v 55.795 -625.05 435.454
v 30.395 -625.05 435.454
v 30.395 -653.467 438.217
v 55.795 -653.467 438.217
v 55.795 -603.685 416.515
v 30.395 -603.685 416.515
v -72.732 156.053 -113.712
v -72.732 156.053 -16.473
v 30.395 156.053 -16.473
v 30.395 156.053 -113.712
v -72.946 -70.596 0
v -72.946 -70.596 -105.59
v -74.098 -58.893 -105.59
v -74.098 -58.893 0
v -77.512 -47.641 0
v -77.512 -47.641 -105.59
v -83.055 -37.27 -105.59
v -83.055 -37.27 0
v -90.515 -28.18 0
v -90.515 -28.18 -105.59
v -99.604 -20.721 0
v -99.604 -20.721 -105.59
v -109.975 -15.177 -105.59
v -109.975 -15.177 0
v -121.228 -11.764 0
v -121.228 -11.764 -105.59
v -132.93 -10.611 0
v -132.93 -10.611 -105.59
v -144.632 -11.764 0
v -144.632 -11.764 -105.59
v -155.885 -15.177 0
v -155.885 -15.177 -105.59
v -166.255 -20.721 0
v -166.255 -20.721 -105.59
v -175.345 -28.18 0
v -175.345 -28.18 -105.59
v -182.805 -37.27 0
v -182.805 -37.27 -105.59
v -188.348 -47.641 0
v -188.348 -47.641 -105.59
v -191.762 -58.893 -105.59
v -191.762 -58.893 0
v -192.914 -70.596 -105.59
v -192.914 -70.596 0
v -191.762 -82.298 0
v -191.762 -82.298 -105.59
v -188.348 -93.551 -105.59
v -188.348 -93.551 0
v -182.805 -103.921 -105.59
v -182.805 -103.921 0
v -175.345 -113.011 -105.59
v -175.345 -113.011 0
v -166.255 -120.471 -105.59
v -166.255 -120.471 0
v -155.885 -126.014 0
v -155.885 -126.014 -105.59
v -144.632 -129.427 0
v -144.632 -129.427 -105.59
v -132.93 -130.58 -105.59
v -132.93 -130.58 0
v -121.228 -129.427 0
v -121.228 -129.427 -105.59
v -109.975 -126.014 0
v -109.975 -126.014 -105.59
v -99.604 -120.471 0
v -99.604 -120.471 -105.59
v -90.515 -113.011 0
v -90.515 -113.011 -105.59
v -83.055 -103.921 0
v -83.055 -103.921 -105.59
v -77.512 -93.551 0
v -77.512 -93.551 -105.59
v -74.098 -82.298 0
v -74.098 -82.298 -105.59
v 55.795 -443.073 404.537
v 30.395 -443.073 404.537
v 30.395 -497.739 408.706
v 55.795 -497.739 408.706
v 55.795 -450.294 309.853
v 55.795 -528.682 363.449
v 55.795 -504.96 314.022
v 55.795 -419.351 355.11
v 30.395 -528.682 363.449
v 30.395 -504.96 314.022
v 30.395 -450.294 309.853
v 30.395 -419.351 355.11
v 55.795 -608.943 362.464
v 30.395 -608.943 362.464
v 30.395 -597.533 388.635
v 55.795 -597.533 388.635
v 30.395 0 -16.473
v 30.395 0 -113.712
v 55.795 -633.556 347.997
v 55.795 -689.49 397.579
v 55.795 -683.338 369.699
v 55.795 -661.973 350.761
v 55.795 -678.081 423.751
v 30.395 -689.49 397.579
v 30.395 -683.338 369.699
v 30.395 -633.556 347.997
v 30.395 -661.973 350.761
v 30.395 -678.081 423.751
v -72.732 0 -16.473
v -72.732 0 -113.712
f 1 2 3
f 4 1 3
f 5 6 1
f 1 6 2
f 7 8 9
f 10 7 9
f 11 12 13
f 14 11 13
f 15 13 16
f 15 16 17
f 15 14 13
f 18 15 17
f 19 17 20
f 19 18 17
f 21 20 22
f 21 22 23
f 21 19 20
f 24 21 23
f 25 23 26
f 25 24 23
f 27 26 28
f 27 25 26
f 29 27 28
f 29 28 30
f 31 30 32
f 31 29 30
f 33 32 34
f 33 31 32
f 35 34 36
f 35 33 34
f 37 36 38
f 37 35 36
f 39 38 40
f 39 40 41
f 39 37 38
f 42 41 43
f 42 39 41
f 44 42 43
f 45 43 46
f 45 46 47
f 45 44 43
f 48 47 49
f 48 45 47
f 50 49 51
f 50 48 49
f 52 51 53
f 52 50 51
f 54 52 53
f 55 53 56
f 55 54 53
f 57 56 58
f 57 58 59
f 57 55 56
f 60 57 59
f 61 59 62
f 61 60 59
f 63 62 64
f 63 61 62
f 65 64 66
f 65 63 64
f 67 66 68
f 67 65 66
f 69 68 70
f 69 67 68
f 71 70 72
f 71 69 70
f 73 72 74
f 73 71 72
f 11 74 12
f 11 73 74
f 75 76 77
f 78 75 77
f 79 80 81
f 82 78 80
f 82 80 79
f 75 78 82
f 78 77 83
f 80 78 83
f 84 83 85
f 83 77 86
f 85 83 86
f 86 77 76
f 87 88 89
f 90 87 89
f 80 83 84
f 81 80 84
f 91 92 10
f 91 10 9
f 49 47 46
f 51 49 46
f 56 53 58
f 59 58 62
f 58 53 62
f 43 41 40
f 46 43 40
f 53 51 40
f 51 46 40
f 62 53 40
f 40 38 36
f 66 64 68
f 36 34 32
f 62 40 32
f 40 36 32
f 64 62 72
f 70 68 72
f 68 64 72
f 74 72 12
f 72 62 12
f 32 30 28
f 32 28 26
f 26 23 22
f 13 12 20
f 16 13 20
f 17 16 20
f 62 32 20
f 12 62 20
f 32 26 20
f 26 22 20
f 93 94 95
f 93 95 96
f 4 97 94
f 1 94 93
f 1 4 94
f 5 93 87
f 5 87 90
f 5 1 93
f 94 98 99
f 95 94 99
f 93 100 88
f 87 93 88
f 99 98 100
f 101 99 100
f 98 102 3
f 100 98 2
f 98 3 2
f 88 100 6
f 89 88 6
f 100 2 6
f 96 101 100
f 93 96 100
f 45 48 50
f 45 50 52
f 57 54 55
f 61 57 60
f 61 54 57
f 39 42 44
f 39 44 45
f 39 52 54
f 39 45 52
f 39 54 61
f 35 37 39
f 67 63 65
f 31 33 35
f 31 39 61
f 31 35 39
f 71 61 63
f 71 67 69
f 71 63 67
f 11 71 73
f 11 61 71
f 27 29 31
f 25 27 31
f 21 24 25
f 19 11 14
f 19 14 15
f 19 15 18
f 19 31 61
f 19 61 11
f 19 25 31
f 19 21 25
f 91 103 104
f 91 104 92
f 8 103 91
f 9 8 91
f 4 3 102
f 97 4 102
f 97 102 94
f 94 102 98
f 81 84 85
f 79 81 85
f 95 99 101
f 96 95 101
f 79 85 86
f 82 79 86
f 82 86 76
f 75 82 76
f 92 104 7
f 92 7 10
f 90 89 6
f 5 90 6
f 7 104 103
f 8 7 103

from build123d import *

# Parameters (mm, degrees)
F0_W     = 103.127422
F0_H     = 97.239232
F1_DEPTH = 156.0528
F2_R     = 59.984293
F3_DEPTH = 105.5899
F5_DEPTH = 25.4


with BuildPart() as f1:
    # F0 (on Front) → F1 (new body)
    with BuildSketch(Plane.XZ):
        with Locations((-21.168261, -65.092397)):
            Rectangle(F0_W, F0_H)
    extrude(amount=-F1_DEPTH)


with BuildPart() as f3:
    # F2 (on Top) → F3 (new body)
    with BuildSketch(Plane.XY):
        with Locations((-132.929862, -70.595644)):
            Circle(F2_R)
    extrude(amount=-F3_DEPTH)


with BuildPart() as f5:
    # F4 (on face) → F5 (new body)
    with BuildSketch(Plane.YZ.offset(30.39545)):
        Polygon((-497.738927, 408.706154), (-528.6825, 363.448594), (-504.960091, 314.021894), (-450.294108, 309.852753), (-419.350534, 355.110313), (-443.072944, 404.537014), align=None)
        Polygon((-633.556439, 347.996819), (-608.942554, 362.463606), (-597.532867, 388.635161), (-603.685491, 416.51484), (-625.050332, 435.453552), (-653.466747, 438.217354), (-678.080632, 423.750567), (-689.490319, 397.579012), (-683.337696, 369.699333), (-661.972855, 350.76062), align=None)
    extrude(amount=F5_DEPTH)


solid = Compound([f1.part, f3.part, f5.part])
